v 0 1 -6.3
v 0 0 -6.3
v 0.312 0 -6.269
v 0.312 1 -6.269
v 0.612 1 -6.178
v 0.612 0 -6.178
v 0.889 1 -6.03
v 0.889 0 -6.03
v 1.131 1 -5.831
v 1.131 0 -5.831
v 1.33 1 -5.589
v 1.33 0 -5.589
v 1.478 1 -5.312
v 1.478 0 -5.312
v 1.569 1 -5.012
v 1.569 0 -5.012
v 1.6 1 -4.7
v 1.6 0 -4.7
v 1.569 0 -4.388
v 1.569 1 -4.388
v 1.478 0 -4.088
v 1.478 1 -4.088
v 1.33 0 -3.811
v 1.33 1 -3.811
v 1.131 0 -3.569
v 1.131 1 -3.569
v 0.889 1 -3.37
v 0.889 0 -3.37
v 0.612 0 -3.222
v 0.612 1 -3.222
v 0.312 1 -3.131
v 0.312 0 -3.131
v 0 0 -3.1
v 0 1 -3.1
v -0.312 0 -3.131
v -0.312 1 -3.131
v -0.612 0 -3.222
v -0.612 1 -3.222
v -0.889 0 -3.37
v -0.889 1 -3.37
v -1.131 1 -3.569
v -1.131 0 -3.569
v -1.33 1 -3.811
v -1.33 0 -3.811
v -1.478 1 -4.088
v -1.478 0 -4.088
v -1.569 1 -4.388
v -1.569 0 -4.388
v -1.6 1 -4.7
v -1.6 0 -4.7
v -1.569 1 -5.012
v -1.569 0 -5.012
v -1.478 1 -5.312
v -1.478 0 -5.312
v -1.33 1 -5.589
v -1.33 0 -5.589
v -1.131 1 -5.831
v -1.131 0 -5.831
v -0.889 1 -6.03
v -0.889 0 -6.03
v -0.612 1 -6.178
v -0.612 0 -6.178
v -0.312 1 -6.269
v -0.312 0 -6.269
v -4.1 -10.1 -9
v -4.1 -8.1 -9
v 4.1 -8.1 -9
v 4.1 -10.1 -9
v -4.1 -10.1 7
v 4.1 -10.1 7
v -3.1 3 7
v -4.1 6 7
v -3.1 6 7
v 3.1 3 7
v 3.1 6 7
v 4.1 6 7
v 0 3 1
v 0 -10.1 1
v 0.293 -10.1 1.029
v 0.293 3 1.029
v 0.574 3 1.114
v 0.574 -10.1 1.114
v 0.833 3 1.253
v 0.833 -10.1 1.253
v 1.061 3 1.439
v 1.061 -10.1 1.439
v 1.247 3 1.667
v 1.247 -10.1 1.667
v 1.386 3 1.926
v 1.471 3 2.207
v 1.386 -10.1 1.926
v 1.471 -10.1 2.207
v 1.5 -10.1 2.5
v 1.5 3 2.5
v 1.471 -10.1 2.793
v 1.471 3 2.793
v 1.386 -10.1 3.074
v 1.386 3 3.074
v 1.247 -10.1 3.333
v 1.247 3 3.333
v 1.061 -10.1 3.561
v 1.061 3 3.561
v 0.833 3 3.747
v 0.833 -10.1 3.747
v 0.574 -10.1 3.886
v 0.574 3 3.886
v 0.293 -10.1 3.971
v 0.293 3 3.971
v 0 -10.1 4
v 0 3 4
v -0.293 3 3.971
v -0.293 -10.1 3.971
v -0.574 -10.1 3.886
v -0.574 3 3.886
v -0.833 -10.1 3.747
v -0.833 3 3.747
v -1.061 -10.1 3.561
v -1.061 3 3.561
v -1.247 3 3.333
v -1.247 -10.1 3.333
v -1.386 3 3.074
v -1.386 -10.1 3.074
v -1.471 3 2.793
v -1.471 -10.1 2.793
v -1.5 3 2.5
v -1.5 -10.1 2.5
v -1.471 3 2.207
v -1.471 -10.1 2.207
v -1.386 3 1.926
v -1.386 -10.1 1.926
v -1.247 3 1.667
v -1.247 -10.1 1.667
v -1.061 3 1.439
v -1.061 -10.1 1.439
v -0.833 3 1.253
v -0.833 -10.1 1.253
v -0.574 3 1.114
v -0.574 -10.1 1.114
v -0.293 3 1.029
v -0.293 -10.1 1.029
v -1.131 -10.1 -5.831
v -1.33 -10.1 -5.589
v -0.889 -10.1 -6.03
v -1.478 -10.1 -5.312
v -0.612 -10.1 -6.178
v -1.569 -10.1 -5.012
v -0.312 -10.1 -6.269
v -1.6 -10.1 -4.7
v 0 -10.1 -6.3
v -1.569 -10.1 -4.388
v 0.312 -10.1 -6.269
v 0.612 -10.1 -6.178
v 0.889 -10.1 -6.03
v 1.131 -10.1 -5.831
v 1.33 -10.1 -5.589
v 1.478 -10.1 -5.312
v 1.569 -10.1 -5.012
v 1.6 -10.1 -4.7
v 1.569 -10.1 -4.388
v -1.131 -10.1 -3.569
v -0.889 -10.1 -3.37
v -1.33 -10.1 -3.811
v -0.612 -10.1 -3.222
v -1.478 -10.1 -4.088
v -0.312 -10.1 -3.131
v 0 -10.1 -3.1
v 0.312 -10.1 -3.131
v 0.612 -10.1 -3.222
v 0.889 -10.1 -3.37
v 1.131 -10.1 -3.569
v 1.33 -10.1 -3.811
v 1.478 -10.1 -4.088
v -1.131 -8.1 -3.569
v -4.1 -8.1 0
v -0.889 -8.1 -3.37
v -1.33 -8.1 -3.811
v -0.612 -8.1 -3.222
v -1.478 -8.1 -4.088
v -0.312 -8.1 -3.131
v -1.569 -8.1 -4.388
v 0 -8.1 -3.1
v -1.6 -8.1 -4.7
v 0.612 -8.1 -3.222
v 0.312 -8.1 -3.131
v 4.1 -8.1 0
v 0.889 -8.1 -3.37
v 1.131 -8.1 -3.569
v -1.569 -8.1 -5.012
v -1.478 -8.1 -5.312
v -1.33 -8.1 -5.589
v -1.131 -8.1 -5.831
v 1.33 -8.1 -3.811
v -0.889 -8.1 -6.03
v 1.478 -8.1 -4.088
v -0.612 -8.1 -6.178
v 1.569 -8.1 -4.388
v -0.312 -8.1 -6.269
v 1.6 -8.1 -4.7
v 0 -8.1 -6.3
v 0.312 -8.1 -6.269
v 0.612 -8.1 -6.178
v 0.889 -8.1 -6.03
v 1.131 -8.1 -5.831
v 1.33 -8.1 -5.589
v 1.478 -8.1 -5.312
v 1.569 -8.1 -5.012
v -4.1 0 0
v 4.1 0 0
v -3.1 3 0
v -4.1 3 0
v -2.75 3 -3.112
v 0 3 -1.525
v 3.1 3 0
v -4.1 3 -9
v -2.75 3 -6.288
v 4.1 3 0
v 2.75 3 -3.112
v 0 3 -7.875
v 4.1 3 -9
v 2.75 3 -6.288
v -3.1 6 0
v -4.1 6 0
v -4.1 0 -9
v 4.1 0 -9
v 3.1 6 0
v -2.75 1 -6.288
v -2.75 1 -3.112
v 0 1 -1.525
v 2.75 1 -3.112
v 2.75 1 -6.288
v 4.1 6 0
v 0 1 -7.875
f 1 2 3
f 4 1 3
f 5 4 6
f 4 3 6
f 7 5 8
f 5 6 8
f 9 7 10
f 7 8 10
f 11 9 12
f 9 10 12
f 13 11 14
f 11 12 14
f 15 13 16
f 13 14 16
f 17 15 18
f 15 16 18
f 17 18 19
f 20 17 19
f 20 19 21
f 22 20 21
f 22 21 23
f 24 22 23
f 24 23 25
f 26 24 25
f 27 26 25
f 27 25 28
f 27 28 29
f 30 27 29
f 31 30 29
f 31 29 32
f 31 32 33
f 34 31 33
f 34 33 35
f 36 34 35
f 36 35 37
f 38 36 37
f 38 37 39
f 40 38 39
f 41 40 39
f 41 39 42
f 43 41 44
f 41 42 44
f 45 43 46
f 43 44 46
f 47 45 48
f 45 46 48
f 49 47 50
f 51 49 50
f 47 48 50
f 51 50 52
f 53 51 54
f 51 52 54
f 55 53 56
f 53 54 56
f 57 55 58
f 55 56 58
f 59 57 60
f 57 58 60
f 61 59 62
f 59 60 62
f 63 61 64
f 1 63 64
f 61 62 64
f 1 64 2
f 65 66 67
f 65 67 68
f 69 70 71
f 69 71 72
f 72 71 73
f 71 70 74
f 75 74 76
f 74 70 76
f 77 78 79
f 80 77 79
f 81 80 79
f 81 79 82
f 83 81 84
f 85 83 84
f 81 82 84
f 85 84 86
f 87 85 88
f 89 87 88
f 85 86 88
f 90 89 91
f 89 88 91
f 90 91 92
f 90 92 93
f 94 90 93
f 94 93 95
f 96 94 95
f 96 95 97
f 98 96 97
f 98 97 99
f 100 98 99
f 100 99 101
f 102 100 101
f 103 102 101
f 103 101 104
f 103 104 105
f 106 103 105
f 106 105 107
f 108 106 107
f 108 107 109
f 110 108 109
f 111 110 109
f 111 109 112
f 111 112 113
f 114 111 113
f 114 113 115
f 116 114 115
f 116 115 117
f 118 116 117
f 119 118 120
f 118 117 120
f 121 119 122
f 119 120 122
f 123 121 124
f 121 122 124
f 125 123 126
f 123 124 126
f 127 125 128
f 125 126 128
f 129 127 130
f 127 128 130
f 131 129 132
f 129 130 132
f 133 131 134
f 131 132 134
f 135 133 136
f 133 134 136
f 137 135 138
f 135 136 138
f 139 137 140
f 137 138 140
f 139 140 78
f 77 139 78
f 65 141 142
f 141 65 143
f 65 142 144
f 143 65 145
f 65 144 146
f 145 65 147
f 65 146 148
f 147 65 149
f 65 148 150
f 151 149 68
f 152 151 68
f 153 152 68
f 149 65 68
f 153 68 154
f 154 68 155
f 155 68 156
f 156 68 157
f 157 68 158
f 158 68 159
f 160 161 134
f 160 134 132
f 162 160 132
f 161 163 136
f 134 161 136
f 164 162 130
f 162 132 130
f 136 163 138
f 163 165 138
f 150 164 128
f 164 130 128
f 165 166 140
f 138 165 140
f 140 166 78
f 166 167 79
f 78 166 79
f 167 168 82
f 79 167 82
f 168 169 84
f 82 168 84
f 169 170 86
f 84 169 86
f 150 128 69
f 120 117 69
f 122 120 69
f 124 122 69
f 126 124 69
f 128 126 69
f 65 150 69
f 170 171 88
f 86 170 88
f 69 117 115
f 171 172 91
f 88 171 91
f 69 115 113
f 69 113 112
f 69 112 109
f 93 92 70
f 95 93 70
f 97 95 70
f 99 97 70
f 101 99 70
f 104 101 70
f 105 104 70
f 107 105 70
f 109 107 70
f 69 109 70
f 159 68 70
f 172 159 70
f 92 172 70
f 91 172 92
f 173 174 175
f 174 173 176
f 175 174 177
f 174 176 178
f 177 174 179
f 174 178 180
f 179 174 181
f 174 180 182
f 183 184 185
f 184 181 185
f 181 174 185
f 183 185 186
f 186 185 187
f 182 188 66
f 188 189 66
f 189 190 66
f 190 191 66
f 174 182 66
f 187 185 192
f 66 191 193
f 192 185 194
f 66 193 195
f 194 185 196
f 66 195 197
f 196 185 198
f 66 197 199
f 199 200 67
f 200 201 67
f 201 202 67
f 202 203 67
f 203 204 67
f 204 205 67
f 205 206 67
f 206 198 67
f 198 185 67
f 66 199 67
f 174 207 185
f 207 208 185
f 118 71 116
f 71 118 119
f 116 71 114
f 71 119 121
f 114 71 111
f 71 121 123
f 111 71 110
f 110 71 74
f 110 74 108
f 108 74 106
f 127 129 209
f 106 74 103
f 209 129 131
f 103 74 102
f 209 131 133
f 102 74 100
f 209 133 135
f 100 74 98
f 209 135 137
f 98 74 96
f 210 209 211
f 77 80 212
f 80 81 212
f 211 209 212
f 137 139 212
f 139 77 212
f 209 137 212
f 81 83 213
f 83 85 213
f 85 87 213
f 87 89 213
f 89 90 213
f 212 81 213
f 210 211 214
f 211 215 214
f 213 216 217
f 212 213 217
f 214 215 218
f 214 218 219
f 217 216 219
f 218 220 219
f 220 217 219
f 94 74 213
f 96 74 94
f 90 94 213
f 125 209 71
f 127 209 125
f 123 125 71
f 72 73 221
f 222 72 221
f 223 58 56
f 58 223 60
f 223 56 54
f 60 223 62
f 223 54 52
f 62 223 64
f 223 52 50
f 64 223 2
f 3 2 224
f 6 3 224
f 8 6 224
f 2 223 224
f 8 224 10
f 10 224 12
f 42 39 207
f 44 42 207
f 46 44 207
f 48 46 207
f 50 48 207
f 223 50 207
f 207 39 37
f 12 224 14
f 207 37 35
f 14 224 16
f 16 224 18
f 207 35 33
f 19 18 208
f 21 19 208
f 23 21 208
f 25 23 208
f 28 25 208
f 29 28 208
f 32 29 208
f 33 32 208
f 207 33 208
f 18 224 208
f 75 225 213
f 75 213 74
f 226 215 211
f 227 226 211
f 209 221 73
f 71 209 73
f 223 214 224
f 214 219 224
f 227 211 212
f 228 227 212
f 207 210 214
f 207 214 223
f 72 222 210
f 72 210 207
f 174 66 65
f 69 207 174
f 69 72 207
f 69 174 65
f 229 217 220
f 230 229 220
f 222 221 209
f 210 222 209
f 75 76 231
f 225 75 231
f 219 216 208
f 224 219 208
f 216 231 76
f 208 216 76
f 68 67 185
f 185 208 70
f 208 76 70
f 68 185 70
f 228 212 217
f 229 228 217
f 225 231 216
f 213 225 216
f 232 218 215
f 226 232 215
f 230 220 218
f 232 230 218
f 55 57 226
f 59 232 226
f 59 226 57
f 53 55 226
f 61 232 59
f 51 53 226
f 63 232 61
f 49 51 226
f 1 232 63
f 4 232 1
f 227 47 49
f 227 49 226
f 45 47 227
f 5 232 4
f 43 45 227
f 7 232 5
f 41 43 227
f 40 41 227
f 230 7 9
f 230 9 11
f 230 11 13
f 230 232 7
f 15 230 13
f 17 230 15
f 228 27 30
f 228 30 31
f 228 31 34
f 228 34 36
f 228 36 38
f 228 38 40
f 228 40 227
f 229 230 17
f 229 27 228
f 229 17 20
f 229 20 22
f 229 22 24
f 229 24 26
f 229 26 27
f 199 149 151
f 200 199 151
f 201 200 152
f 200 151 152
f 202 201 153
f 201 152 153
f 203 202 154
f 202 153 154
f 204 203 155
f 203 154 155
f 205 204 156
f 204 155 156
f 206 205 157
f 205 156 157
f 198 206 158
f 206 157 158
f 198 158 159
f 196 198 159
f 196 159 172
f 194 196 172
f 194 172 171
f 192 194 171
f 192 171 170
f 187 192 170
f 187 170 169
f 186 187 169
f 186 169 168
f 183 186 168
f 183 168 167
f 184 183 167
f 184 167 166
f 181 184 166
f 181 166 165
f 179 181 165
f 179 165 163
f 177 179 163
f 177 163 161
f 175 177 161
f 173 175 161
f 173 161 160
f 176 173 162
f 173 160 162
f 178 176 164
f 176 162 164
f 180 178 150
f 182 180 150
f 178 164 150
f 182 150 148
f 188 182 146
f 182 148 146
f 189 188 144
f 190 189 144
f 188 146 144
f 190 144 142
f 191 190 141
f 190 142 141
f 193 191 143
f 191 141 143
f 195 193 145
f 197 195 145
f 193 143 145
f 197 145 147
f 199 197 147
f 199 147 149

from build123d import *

# Parameters (mm, degrees)
PAD_DEPTH       = 4.1
SKETCH002_R     = 1.5
SKETCH002_R_2   = 1.6
POCKET_DEPTH    = 16.101
SKETCH003_W     = 7
SKETCH003_H     = 6.2
POCKET001_DEPTH = 3
POCKET002_DEPTH = 16.101
POCKET003_DEPTH = 2


with BuildPart() as part:
    # Sketch → Pad (new body, symmetric)
    with BuildSketch(Plane.YZ):
        Polygon((-10.1, -9), (-10.1, 7), (6, 7), (6, 0), (3, 0), (3, -9), (0, -9), (0, 0), (-8.1, 0), (-8.1, -9), align=None)
    extrude(amount=PAD_DEPTH, both=True)

    # Sketch002 (on Face1 of Pad) → Pocket (cut, through all)
    with BuildSketch(Plane(origin=(0, -10.1, 0), x_dir=(0, 0, -1), z_dir=(0, -1, 0))):
        with Locations((-2.5, 0)):
            Circle(SKETCH002_R)
        with Locations((4.7, 0)):
            Circle(SKETCH002_R_2)
    extrude(amount=-POCKET_DEPTH, mode=Mode.SUBTRACT)

    # Sketch003 (on Face9 of Pocket) → Pocket001 (cut)
    with BuildSketch(Plane.ZX.offset(6)):
        with Locations((3.5, 0)):
            Rectangle(SKETCH003_W, SKETCH003_H)
    extrude(amount=-POCKET001_DEPTH, mode=Mode.SUBTRACT)

    # Sketch002 (on Face1 of Pad) → Pocket002 (cut, through all)
    with BuildSketch(Plane(origin=(0, -10.1, 0), x_dir=(0, 0, -1), z_dir=(0, -1, 0))):
        with Locations((-2.5, 0)):
            Circle(SKETCH002_R)
        with Locations((4.7, 0)):
            Circle(SKETCH002_R_2)
    extrude(amount=-POCKET002_DEPTH, mode=Mode.SUBTRACT)

    # Sketch004 (on Face19 of Pocket001) → Pocket003 (cut)
    with BuildSketch(Plane.ZX.offset(3)):
        Polygon((-7.875426, 0), (-6.287713, -2.75), (-3.112287, -2.75), (-1.524574, 0), (-3.112287, 2.75), (-6.287713, 2.75), align=None)
    extrude(amount=-POCKET003_DEPTH, mode=Mode.SUBTRACT)


solid = part.part
